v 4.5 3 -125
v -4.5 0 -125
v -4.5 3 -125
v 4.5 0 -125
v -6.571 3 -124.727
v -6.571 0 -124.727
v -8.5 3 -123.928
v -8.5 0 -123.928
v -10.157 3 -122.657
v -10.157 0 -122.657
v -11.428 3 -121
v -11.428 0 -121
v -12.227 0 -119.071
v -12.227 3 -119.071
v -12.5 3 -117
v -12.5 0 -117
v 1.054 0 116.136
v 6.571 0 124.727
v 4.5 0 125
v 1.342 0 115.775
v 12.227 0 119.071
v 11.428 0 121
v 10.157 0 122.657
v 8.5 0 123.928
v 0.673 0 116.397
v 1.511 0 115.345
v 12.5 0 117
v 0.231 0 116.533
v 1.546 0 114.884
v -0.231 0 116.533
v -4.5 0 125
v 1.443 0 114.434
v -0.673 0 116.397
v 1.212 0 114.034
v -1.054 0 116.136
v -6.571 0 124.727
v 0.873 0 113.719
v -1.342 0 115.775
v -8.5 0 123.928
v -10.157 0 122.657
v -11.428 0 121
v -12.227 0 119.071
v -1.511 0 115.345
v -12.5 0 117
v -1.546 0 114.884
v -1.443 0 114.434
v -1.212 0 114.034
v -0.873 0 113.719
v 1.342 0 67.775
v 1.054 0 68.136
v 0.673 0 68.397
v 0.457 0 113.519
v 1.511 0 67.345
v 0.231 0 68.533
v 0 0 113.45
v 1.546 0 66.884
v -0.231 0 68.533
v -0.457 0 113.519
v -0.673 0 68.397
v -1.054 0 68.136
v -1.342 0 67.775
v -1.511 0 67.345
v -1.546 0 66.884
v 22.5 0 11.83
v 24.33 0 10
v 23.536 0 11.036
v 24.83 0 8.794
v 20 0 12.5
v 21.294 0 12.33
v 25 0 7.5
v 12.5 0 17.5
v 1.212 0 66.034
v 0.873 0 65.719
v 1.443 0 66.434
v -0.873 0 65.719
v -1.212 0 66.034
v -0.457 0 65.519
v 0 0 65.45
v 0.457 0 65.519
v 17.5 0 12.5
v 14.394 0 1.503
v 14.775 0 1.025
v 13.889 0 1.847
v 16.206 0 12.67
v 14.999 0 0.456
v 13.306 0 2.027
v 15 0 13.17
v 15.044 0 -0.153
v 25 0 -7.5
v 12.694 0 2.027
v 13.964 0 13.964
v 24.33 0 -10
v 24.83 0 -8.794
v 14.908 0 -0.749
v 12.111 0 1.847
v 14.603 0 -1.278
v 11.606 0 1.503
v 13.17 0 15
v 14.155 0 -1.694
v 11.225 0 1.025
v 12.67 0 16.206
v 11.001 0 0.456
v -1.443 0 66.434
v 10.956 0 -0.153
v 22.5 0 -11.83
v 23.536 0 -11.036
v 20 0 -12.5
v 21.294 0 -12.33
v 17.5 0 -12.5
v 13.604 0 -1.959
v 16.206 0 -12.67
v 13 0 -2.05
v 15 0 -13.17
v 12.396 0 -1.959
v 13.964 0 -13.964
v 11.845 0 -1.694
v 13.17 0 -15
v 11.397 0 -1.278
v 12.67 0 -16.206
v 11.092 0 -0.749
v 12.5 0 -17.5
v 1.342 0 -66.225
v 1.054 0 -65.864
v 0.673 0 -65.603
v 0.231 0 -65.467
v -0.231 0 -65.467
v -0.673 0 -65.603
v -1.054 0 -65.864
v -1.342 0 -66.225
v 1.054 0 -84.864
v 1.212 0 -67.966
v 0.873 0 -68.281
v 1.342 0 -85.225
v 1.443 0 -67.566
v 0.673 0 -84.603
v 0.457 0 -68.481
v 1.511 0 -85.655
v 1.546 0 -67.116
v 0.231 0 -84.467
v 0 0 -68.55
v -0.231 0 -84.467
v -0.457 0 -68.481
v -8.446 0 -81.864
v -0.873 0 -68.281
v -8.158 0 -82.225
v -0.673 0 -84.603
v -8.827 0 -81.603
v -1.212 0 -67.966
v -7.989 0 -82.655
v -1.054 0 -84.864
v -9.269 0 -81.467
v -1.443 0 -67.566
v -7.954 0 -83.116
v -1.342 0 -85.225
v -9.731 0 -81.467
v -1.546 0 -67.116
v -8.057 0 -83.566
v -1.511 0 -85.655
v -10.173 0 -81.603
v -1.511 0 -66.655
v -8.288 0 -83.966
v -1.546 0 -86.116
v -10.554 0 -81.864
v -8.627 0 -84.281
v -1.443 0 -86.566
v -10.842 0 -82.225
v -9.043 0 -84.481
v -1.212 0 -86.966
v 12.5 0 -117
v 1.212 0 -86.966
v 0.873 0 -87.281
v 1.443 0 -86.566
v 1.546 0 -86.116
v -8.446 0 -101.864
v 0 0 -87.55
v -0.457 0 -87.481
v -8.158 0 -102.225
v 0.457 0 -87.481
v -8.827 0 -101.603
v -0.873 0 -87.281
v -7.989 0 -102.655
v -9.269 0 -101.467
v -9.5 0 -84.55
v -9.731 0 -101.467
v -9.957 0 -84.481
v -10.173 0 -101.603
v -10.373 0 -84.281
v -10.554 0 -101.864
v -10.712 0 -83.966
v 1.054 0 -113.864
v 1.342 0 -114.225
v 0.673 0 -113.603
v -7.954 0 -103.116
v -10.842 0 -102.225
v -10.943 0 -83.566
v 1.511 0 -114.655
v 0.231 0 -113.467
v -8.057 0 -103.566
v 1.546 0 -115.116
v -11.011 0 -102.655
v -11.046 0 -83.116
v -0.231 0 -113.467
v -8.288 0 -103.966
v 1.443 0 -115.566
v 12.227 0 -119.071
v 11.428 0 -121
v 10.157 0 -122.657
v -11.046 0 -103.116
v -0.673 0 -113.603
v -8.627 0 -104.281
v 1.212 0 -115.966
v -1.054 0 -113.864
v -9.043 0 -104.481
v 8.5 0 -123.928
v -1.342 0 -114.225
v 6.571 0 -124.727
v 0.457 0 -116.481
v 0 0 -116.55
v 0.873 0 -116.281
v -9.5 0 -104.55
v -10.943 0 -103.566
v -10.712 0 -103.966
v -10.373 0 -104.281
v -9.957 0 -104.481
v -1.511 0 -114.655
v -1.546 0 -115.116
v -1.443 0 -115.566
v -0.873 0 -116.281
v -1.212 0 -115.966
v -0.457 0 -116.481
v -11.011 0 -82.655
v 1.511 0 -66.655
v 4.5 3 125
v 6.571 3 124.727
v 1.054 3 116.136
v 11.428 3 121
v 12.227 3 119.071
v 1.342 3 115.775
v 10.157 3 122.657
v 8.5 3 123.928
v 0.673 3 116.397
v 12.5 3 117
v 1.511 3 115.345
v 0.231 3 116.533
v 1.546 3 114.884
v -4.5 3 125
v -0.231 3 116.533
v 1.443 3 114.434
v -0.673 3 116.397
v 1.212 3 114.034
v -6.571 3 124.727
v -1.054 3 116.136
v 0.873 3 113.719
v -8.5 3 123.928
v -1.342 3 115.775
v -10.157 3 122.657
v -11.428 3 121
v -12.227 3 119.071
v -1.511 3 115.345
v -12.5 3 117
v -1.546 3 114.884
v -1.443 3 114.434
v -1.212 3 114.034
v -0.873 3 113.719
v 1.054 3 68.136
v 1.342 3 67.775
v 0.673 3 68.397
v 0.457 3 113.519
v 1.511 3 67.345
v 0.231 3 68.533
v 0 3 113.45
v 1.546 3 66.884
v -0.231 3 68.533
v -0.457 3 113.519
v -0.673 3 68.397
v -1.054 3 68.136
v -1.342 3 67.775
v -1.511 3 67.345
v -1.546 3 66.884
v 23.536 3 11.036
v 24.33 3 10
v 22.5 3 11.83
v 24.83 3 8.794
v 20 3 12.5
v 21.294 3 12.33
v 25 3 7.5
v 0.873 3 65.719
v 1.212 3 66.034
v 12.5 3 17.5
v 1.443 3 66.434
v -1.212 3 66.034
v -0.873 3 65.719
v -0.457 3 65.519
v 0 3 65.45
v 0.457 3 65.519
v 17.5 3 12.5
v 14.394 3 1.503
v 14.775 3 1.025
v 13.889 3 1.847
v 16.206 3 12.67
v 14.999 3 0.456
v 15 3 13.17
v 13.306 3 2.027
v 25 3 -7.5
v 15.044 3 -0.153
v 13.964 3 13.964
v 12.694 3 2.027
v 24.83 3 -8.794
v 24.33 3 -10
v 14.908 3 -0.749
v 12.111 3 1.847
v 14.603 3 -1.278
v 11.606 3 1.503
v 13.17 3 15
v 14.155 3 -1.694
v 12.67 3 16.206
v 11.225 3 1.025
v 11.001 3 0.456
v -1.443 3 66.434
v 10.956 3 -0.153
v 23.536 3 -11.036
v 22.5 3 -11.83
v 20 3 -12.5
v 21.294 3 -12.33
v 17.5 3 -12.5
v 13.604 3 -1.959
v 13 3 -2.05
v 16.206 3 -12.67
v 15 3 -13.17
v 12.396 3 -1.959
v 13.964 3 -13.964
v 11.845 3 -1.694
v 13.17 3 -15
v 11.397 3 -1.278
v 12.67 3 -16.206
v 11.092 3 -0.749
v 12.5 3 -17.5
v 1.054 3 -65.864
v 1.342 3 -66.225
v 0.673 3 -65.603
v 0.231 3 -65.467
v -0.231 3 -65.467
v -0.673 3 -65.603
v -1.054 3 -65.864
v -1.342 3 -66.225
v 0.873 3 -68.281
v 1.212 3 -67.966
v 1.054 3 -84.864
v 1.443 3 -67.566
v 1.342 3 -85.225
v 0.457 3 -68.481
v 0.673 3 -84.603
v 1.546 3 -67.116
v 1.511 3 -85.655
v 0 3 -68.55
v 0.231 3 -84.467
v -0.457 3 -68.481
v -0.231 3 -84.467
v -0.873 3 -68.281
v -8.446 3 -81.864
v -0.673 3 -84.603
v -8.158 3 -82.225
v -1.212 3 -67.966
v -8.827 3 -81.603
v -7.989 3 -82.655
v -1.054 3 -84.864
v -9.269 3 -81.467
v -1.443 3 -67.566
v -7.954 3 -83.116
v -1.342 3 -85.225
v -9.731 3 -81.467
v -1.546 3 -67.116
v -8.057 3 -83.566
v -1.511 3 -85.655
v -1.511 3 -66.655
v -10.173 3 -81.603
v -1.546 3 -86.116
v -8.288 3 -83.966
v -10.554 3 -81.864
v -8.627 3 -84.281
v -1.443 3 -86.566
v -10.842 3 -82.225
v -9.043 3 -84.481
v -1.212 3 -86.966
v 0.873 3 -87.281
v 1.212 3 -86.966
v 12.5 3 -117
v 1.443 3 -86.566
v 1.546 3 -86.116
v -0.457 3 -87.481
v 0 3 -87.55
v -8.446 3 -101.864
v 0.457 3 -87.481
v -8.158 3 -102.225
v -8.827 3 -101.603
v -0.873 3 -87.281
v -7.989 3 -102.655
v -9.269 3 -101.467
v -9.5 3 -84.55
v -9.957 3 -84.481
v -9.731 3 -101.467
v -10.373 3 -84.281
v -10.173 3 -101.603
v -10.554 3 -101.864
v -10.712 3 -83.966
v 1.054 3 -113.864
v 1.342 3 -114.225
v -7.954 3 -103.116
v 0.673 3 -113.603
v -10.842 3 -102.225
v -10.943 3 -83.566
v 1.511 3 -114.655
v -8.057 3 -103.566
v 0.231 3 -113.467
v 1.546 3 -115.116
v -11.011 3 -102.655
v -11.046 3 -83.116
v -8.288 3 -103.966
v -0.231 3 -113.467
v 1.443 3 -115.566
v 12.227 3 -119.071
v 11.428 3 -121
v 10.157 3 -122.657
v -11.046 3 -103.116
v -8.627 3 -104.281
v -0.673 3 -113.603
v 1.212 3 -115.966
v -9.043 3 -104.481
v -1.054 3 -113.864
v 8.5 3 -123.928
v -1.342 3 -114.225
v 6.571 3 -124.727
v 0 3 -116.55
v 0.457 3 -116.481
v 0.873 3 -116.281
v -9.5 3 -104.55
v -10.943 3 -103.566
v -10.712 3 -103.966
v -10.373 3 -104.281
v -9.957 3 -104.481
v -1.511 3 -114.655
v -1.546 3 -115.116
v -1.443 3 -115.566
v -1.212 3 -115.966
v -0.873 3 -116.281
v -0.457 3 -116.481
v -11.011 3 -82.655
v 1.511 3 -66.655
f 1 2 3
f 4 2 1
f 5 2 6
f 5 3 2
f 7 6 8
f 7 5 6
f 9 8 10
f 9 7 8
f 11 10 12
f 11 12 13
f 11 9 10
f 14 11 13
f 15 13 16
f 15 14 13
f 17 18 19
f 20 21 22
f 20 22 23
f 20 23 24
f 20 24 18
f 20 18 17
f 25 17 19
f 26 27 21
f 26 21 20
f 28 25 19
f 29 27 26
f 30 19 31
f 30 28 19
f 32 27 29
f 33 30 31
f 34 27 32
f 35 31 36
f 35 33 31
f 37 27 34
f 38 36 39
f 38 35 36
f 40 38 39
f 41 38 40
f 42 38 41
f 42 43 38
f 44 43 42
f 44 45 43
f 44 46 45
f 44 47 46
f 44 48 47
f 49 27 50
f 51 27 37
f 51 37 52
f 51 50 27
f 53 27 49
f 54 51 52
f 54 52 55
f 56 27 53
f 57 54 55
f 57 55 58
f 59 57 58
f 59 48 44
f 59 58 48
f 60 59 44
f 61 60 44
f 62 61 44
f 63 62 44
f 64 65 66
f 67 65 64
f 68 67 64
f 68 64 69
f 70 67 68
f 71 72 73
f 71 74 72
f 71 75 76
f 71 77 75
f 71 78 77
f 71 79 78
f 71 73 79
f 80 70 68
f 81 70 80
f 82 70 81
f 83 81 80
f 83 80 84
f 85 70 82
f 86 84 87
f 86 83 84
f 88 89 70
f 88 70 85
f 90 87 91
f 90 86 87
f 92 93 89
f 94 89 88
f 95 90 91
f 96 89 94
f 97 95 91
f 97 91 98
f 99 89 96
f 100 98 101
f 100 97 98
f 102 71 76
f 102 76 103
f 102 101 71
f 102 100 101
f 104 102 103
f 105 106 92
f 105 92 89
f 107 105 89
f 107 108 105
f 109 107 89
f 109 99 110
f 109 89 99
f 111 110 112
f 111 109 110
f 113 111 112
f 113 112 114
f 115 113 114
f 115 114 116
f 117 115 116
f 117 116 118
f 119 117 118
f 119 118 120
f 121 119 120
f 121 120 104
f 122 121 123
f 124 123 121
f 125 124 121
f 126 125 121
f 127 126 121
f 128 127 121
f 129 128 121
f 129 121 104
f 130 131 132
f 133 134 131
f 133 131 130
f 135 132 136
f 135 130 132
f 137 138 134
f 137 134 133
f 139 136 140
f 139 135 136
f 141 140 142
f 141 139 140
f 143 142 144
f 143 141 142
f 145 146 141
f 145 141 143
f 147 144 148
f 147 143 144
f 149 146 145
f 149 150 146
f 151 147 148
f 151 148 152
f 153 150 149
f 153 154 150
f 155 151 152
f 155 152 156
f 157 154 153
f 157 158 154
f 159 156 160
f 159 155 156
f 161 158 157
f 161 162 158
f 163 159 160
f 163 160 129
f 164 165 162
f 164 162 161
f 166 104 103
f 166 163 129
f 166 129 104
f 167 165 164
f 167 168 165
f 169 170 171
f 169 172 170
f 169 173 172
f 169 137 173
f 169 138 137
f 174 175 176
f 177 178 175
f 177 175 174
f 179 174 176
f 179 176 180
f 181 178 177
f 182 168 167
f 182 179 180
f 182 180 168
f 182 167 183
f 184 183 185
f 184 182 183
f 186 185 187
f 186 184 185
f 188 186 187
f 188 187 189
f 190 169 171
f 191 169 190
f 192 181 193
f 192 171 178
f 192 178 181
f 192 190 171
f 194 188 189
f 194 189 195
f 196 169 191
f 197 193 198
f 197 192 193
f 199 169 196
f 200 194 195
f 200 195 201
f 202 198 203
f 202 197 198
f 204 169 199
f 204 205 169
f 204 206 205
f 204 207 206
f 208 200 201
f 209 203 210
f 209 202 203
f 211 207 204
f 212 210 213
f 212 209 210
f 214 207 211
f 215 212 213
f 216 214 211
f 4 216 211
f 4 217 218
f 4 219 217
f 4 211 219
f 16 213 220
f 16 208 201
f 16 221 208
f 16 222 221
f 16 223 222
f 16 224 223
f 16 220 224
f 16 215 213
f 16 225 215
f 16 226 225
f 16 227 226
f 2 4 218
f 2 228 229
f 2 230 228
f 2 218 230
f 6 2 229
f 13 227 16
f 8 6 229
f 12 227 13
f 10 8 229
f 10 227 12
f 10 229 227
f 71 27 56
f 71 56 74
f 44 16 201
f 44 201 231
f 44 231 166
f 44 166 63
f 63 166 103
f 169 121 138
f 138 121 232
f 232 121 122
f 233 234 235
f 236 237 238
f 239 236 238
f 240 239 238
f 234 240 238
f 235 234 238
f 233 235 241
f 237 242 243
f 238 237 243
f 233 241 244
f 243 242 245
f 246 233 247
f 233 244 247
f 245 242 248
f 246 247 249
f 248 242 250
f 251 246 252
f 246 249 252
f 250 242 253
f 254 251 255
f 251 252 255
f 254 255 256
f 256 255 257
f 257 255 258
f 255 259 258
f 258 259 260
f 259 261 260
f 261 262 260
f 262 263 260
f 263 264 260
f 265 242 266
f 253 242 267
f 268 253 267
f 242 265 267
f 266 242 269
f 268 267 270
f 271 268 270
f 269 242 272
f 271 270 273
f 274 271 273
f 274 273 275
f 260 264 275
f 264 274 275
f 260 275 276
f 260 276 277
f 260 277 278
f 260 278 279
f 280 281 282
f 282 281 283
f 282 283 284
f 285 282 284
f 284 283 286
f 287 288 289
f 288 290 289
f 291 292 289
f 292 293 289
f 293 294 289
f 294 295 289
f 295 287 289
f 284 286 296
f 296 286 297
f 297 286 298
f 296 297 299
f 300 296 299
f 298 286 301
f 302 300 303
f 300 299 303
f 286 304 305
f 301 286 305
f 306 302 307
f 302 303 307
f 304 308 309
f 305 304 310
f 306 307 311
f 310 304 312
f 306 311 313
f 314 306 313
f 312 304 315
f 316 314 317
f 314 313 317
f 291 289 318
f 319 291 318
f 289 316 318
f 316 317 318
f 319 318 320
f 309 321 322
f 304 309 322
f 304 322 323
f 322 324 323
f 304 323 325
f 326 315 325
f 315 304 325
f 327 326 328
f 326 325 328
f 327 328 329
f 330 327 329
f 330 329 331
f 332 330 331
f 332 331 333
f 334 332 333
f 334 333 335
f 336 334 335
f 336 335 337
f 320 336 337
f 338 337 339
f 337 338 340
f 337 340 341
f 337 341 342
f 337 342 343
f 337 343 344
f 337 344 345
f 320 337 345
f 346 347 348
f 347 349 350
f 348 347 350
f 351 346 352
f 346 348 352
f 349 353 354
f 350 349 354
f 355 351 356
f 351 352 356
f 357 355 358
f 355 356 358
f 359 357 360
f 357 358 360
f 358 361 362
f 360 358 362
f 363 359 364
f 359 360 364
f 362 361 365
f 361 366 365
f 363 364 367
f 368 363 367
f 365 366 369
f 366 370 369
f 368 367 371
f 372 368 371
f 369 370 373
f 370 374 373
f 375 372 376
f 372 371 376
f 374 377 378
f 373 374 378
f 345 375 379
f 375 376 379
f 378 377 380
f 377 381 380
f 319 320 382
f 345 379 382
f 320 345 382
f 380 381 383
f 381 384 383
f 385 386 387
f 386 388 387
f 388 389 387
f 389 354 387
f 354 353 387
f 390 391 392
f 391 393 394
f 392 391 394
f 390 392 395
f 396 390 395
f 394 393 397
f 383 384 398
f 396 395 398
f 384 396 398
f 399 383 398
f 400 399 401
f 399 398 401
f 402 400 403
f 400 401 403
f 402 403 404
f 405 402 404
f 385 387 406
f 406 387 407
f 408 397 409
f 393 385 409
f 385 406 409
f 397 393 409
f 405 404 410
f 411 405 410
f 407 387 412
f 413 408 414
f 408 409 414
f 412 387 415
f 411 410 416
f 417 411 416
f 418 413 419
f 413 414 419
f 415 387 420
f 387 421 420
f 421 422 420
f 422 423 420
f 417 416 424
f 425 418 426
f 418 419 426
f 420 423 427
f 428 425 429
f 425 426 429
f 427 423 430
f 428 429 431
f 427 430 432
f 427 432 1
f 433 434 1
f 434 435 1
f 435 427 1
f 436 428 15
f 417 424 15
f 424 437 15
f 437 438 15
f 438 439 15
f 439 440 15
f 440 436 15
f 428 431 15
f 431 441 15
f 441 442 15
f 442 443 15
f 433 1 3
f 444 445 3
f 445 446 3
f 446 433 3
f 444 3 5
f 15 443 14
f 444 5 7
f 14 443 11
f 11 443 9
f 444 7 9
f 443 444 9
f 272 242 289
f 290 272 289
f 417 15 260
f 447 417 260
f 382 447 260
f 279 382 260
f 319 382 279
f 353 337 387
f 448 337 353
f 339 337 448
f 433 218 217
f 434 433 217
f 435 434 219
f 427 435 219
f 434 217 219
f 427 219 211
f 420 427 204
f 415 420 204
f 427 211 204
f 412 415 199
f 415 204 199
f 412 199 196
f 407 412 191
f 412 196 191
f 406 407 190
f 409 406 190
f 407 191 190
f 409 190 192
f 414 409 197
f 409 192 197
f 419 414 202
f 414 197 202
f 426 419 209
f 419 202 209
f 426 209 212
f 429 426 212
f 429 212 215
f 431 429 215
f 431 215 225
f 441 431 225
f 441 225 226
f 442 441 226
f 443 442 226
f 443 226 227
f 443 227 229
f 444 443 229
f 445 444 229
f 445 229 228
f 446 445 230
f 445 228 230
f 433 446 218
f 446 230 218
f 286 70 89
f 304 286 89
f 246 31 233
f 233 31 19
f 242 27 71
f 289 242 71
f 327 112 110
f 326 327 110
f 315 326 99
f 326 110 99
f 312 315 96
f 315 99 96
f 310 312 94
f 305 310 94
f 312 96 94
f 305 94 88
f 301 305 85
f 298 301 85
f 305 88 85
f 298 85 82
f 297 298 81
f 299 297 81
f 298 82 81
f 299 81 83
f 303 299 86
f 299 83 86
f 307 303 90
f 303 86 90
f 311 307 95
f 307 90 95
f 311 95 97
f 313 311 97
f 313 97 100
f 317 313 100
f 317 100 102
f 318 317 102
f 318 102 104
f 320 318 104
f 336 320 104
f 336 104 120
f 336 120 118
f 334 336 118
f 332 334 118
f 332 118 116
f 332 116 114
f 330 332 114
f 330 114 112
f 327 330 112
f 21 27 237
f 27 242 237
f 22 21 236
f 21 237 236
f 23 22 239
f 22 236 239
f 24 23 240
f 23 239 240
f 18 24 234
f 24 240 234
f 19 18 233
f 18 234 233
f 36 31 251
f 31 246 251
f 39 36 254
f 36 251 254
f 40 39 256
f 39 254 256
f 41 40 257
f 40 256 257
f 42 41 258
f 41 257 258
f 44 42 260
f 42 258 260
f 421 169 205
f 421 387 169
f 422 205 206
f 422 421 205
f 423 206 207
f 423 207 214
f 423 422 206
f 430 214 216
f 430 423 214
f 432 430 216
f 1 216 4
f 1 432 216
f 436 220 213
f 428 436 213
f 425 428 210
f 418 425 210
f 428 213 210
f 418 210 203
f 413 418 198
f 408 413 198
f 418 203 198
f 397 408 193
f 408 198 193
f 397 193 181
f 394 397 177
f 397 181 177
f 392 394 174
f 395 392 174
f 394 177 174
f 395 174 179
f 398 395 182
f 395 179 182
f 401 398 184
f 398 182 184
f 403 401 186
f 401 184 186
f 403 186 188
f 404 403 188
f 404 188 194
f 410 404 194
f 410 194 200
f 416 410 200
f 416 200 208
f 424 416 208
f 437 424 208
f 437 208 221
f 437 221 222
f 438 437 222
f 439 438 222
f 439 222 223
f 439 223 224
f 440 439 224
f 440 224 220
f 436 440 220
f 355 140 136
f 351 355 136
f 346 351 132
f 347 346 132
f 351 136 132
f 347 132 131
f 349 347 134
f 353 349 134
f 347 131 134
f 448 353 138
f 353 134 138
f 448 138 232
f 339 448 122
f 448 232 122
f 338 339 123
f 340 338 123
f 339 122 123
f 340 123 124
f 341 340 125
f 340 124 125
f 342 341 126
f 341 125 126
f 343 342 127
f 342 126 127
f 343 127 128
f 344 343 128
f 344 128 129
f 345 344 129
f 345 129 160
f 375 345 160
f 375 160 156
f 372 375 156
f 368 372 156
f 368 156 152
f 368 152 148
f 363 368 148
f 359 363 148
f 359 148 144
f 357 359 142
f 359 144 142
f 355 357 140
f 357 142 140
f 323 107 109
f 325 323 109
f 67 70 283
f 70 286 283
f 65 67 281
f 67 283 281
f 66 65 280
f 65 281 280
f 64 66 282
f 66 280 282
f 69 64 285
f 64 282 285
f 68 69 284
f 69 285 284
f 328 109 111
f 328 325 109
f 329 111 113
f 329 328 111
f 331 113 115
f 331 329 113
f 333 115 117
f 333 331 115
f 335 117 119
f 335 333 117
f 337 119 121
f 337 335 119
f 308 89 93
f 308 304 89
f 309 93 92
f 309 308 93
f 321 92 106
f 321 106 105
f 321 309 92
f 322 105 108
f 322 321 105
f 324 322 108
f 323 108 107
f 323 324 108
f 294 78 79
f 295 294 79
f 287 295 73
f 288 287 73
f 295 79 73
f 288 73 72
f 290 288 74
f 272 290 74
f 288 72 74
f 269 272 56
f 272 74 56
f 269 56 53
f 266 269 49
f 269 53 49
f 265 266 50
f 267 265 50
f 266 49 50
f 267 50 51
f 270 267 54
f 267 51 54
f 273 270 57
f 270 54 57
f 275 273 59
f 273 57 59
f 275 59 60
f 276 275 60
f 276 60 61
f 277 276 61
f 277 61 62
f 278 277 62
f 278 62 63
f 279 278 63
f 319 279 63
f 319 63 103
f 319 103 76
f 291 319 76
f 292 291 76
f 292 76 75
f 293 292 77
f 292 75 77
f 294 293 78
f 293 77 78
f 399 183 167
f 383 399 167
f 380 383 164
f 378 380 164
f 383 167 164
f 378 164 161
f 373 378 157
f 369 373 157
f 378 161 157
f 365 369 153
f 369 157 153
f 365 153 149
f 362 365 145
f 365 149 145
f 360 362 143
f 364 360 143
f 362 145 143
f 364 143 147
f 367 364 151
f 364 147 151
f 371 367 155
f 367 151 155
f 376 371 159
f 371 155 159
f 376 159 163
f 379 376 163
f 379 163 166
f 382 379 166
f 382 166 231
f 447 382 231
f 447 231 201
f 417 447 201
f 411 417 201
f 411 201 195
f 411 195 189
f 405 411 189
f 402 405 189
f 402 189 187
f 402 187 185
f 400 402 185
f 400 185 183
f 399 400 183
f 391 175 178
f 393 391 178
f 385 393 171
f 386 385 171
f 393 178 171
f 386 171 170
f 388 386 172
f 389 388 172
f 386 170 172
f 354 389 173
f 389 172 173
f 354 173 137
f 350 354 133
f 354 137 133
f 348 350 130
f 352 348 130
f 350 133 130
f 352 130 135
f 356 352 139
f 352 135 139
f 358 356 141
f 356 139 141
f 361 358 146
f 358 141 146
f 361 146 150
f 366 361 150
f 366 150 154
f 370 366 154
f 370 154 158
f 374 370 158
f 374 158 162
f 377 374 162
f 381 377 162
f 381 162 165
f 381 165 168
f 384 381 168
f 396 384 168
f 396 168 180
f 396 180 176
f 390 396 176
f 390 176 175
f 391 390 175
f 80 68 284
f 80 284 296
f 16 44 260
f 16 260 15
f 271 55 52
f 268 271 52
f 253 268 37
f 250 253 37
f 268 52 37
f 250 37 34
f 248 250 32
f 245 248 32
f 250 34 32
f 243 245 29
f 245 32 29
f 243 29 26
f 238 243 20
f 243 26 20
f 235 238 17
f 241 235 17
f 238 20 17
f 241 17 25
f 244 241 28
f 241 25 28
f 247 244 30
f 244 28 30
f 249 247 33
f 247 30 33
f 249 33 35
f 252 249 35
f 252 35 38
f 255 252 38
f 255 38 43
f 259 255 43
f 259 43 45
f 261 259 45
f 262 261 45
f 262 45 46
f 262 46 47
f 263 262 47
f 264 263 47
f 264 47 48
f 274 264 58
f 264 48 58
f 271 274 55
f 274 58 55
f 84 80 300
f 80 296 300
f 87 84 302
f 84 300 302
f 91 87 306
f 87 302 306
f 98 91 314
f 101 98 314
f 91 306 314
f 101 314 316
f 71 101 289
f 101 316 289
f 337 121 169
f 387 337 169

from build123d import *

# Parameters (mm, degrees)
SKETCH_1_W          = 25
SKETCH_1_H          = 250
EXTRUDE_1_DEPTH     = 3
SKETCH_2_R          = 1.55
CUT_EXTRUDE_1_DEPTH = 3
SKETCH_3_R          = 1.55
CUT_EXTRUDE_2_DEPTH = 10
SKETCH_5_W          = 25
SKETCH_5_H          = 25
EXTRUDE_2_DEPTH     = 3
SKETCH_6_R          = 2.05
CUT_EXTRUDE_3_DEPTH = 10
SKETCH_7_R          = 1.55
CUT_EXTRUDE_4_DEPTH = 10
FILLET_1_R          = 5
FILLET_2_R          = 8


with BuildPart() as part:
    # 草图1 → 凸台-拉伸1 (new body)
    with BuildSketch(Plane(origin=(0, 0, 0), x_dir=(1, 0, 0), z_dir=(0, 1, 0))):
        Rectangle(SKETCH_1_W, SKETCH_1_H)
    extrude(amount=EXTRUDE_1_DEPTH)

    # 草图2 → 切除-拉伸1 (cut)
    with BuildSketch(Plane(origin=(0, 0, 0), x_dir=(-1, 0, 0), z_dir=(0, -1, 0))):
        with Locations(Location((0, 115, 0), (0, 0, 90))):
            Circle(SKETCH_2_R)
        with Locations(Location((0, 67, 0), (0, 0, 90))):
            Circle(SKETCH_2_R)
        with Locations(Location((0, -67, 0), (0, 0, 90))):
            Circle(SKETCH_2_R)
        with Locations(Location((0, -115, 0), (0, 0, 90))):
            Circle(SKETCH_2_R)
    extrude(amount=-CUT_EXTRUDE_1_DEPTH, mode=Mode.SUBTRACT)

    # 草图3 → 切除-拉伸2 (cut)
    with BuildSketch(Plane(origin=(0, 0, 0), x_dir=(-1, 0, 0), z_dir=(0, -1, 0))):
        with Locations(Location((9.5, 83, 0), (0, 0, 90))):
            Circle(SKETCH_3_R)
        with Locations(Location((9.5, 103, 0), (0, 0, 90))):
            Circle(SKETCH_3_R)
    extrude(amount=-CUT_EXTRUDE_2_DEPTH, mode=Mode.SUBTRACT)

    # 草图5 → 凸台-拉伸2 (add, through all)
    with BuildSketch(Plane(origin=(0, 0, 0), x_dir=(-1, 0, 0), z_dir=(0, -1, 0))):
        with Locations((-12.5, 0)):
            Rectangle(SKETCH_5_W, SKETCH_5_H)
    extrude(amount=-EXTRUDE_2_DEPTH)

    # 草图6 → 切除-拉伸3 (cut)
    with BuildSketch(Plane(origin=(0, 0, 0), x_dir=(-1, 0, 0), z_dir=(0, -1, 0))):
        with Locations(Location((-13, 0, 0), (0, 0, 90))):
            Circle(SKETCH_6_R)
    extrude(amount=-CUT_EXTRUDE_3_DEPTH, mode=Mode.SUBTRACT)

    # 草图7 → 切除-拉伸4 (cut)
    with BuildSketch(Plane(origin=(0, 0, 0), x_dir=(-1, 0, 0), z_dir=(0, -1, 0))):
        with Locations(Location((0, 86, 0), (0, 0, 90))):
            Circle(SKETCH_7_R)
    extrude(amount=-CUT_EXTRUDE_4_DEPTH, mode=Mode.SUBTRACT)

    # 圆角1
    fillet_1_edges = [part.edges().sort_by_distance(p)[0] for p in [
        (25, 1.5, -12.5),
        (12.5, 1.5, 12.5),
        (25, 1.5, 12.5),
        (12.5, 1.5, -12.5),
    ]]
    fillet(fillet_1_edges, radius=FILLET_1_R)

    # 圆角2
    fillet_2_edges = [part.edges().sort_by_distance(p)[0] for p in [
        (12.5, 1.5, 125),
        (-12.5, 1.5, 125),
        (-12.5, 1.5, -125),
        (12.5, 1.5, -125),
    ]]
    fillet(fillet_2_edges, radius=FILLET_2_R)


solid = part.part
